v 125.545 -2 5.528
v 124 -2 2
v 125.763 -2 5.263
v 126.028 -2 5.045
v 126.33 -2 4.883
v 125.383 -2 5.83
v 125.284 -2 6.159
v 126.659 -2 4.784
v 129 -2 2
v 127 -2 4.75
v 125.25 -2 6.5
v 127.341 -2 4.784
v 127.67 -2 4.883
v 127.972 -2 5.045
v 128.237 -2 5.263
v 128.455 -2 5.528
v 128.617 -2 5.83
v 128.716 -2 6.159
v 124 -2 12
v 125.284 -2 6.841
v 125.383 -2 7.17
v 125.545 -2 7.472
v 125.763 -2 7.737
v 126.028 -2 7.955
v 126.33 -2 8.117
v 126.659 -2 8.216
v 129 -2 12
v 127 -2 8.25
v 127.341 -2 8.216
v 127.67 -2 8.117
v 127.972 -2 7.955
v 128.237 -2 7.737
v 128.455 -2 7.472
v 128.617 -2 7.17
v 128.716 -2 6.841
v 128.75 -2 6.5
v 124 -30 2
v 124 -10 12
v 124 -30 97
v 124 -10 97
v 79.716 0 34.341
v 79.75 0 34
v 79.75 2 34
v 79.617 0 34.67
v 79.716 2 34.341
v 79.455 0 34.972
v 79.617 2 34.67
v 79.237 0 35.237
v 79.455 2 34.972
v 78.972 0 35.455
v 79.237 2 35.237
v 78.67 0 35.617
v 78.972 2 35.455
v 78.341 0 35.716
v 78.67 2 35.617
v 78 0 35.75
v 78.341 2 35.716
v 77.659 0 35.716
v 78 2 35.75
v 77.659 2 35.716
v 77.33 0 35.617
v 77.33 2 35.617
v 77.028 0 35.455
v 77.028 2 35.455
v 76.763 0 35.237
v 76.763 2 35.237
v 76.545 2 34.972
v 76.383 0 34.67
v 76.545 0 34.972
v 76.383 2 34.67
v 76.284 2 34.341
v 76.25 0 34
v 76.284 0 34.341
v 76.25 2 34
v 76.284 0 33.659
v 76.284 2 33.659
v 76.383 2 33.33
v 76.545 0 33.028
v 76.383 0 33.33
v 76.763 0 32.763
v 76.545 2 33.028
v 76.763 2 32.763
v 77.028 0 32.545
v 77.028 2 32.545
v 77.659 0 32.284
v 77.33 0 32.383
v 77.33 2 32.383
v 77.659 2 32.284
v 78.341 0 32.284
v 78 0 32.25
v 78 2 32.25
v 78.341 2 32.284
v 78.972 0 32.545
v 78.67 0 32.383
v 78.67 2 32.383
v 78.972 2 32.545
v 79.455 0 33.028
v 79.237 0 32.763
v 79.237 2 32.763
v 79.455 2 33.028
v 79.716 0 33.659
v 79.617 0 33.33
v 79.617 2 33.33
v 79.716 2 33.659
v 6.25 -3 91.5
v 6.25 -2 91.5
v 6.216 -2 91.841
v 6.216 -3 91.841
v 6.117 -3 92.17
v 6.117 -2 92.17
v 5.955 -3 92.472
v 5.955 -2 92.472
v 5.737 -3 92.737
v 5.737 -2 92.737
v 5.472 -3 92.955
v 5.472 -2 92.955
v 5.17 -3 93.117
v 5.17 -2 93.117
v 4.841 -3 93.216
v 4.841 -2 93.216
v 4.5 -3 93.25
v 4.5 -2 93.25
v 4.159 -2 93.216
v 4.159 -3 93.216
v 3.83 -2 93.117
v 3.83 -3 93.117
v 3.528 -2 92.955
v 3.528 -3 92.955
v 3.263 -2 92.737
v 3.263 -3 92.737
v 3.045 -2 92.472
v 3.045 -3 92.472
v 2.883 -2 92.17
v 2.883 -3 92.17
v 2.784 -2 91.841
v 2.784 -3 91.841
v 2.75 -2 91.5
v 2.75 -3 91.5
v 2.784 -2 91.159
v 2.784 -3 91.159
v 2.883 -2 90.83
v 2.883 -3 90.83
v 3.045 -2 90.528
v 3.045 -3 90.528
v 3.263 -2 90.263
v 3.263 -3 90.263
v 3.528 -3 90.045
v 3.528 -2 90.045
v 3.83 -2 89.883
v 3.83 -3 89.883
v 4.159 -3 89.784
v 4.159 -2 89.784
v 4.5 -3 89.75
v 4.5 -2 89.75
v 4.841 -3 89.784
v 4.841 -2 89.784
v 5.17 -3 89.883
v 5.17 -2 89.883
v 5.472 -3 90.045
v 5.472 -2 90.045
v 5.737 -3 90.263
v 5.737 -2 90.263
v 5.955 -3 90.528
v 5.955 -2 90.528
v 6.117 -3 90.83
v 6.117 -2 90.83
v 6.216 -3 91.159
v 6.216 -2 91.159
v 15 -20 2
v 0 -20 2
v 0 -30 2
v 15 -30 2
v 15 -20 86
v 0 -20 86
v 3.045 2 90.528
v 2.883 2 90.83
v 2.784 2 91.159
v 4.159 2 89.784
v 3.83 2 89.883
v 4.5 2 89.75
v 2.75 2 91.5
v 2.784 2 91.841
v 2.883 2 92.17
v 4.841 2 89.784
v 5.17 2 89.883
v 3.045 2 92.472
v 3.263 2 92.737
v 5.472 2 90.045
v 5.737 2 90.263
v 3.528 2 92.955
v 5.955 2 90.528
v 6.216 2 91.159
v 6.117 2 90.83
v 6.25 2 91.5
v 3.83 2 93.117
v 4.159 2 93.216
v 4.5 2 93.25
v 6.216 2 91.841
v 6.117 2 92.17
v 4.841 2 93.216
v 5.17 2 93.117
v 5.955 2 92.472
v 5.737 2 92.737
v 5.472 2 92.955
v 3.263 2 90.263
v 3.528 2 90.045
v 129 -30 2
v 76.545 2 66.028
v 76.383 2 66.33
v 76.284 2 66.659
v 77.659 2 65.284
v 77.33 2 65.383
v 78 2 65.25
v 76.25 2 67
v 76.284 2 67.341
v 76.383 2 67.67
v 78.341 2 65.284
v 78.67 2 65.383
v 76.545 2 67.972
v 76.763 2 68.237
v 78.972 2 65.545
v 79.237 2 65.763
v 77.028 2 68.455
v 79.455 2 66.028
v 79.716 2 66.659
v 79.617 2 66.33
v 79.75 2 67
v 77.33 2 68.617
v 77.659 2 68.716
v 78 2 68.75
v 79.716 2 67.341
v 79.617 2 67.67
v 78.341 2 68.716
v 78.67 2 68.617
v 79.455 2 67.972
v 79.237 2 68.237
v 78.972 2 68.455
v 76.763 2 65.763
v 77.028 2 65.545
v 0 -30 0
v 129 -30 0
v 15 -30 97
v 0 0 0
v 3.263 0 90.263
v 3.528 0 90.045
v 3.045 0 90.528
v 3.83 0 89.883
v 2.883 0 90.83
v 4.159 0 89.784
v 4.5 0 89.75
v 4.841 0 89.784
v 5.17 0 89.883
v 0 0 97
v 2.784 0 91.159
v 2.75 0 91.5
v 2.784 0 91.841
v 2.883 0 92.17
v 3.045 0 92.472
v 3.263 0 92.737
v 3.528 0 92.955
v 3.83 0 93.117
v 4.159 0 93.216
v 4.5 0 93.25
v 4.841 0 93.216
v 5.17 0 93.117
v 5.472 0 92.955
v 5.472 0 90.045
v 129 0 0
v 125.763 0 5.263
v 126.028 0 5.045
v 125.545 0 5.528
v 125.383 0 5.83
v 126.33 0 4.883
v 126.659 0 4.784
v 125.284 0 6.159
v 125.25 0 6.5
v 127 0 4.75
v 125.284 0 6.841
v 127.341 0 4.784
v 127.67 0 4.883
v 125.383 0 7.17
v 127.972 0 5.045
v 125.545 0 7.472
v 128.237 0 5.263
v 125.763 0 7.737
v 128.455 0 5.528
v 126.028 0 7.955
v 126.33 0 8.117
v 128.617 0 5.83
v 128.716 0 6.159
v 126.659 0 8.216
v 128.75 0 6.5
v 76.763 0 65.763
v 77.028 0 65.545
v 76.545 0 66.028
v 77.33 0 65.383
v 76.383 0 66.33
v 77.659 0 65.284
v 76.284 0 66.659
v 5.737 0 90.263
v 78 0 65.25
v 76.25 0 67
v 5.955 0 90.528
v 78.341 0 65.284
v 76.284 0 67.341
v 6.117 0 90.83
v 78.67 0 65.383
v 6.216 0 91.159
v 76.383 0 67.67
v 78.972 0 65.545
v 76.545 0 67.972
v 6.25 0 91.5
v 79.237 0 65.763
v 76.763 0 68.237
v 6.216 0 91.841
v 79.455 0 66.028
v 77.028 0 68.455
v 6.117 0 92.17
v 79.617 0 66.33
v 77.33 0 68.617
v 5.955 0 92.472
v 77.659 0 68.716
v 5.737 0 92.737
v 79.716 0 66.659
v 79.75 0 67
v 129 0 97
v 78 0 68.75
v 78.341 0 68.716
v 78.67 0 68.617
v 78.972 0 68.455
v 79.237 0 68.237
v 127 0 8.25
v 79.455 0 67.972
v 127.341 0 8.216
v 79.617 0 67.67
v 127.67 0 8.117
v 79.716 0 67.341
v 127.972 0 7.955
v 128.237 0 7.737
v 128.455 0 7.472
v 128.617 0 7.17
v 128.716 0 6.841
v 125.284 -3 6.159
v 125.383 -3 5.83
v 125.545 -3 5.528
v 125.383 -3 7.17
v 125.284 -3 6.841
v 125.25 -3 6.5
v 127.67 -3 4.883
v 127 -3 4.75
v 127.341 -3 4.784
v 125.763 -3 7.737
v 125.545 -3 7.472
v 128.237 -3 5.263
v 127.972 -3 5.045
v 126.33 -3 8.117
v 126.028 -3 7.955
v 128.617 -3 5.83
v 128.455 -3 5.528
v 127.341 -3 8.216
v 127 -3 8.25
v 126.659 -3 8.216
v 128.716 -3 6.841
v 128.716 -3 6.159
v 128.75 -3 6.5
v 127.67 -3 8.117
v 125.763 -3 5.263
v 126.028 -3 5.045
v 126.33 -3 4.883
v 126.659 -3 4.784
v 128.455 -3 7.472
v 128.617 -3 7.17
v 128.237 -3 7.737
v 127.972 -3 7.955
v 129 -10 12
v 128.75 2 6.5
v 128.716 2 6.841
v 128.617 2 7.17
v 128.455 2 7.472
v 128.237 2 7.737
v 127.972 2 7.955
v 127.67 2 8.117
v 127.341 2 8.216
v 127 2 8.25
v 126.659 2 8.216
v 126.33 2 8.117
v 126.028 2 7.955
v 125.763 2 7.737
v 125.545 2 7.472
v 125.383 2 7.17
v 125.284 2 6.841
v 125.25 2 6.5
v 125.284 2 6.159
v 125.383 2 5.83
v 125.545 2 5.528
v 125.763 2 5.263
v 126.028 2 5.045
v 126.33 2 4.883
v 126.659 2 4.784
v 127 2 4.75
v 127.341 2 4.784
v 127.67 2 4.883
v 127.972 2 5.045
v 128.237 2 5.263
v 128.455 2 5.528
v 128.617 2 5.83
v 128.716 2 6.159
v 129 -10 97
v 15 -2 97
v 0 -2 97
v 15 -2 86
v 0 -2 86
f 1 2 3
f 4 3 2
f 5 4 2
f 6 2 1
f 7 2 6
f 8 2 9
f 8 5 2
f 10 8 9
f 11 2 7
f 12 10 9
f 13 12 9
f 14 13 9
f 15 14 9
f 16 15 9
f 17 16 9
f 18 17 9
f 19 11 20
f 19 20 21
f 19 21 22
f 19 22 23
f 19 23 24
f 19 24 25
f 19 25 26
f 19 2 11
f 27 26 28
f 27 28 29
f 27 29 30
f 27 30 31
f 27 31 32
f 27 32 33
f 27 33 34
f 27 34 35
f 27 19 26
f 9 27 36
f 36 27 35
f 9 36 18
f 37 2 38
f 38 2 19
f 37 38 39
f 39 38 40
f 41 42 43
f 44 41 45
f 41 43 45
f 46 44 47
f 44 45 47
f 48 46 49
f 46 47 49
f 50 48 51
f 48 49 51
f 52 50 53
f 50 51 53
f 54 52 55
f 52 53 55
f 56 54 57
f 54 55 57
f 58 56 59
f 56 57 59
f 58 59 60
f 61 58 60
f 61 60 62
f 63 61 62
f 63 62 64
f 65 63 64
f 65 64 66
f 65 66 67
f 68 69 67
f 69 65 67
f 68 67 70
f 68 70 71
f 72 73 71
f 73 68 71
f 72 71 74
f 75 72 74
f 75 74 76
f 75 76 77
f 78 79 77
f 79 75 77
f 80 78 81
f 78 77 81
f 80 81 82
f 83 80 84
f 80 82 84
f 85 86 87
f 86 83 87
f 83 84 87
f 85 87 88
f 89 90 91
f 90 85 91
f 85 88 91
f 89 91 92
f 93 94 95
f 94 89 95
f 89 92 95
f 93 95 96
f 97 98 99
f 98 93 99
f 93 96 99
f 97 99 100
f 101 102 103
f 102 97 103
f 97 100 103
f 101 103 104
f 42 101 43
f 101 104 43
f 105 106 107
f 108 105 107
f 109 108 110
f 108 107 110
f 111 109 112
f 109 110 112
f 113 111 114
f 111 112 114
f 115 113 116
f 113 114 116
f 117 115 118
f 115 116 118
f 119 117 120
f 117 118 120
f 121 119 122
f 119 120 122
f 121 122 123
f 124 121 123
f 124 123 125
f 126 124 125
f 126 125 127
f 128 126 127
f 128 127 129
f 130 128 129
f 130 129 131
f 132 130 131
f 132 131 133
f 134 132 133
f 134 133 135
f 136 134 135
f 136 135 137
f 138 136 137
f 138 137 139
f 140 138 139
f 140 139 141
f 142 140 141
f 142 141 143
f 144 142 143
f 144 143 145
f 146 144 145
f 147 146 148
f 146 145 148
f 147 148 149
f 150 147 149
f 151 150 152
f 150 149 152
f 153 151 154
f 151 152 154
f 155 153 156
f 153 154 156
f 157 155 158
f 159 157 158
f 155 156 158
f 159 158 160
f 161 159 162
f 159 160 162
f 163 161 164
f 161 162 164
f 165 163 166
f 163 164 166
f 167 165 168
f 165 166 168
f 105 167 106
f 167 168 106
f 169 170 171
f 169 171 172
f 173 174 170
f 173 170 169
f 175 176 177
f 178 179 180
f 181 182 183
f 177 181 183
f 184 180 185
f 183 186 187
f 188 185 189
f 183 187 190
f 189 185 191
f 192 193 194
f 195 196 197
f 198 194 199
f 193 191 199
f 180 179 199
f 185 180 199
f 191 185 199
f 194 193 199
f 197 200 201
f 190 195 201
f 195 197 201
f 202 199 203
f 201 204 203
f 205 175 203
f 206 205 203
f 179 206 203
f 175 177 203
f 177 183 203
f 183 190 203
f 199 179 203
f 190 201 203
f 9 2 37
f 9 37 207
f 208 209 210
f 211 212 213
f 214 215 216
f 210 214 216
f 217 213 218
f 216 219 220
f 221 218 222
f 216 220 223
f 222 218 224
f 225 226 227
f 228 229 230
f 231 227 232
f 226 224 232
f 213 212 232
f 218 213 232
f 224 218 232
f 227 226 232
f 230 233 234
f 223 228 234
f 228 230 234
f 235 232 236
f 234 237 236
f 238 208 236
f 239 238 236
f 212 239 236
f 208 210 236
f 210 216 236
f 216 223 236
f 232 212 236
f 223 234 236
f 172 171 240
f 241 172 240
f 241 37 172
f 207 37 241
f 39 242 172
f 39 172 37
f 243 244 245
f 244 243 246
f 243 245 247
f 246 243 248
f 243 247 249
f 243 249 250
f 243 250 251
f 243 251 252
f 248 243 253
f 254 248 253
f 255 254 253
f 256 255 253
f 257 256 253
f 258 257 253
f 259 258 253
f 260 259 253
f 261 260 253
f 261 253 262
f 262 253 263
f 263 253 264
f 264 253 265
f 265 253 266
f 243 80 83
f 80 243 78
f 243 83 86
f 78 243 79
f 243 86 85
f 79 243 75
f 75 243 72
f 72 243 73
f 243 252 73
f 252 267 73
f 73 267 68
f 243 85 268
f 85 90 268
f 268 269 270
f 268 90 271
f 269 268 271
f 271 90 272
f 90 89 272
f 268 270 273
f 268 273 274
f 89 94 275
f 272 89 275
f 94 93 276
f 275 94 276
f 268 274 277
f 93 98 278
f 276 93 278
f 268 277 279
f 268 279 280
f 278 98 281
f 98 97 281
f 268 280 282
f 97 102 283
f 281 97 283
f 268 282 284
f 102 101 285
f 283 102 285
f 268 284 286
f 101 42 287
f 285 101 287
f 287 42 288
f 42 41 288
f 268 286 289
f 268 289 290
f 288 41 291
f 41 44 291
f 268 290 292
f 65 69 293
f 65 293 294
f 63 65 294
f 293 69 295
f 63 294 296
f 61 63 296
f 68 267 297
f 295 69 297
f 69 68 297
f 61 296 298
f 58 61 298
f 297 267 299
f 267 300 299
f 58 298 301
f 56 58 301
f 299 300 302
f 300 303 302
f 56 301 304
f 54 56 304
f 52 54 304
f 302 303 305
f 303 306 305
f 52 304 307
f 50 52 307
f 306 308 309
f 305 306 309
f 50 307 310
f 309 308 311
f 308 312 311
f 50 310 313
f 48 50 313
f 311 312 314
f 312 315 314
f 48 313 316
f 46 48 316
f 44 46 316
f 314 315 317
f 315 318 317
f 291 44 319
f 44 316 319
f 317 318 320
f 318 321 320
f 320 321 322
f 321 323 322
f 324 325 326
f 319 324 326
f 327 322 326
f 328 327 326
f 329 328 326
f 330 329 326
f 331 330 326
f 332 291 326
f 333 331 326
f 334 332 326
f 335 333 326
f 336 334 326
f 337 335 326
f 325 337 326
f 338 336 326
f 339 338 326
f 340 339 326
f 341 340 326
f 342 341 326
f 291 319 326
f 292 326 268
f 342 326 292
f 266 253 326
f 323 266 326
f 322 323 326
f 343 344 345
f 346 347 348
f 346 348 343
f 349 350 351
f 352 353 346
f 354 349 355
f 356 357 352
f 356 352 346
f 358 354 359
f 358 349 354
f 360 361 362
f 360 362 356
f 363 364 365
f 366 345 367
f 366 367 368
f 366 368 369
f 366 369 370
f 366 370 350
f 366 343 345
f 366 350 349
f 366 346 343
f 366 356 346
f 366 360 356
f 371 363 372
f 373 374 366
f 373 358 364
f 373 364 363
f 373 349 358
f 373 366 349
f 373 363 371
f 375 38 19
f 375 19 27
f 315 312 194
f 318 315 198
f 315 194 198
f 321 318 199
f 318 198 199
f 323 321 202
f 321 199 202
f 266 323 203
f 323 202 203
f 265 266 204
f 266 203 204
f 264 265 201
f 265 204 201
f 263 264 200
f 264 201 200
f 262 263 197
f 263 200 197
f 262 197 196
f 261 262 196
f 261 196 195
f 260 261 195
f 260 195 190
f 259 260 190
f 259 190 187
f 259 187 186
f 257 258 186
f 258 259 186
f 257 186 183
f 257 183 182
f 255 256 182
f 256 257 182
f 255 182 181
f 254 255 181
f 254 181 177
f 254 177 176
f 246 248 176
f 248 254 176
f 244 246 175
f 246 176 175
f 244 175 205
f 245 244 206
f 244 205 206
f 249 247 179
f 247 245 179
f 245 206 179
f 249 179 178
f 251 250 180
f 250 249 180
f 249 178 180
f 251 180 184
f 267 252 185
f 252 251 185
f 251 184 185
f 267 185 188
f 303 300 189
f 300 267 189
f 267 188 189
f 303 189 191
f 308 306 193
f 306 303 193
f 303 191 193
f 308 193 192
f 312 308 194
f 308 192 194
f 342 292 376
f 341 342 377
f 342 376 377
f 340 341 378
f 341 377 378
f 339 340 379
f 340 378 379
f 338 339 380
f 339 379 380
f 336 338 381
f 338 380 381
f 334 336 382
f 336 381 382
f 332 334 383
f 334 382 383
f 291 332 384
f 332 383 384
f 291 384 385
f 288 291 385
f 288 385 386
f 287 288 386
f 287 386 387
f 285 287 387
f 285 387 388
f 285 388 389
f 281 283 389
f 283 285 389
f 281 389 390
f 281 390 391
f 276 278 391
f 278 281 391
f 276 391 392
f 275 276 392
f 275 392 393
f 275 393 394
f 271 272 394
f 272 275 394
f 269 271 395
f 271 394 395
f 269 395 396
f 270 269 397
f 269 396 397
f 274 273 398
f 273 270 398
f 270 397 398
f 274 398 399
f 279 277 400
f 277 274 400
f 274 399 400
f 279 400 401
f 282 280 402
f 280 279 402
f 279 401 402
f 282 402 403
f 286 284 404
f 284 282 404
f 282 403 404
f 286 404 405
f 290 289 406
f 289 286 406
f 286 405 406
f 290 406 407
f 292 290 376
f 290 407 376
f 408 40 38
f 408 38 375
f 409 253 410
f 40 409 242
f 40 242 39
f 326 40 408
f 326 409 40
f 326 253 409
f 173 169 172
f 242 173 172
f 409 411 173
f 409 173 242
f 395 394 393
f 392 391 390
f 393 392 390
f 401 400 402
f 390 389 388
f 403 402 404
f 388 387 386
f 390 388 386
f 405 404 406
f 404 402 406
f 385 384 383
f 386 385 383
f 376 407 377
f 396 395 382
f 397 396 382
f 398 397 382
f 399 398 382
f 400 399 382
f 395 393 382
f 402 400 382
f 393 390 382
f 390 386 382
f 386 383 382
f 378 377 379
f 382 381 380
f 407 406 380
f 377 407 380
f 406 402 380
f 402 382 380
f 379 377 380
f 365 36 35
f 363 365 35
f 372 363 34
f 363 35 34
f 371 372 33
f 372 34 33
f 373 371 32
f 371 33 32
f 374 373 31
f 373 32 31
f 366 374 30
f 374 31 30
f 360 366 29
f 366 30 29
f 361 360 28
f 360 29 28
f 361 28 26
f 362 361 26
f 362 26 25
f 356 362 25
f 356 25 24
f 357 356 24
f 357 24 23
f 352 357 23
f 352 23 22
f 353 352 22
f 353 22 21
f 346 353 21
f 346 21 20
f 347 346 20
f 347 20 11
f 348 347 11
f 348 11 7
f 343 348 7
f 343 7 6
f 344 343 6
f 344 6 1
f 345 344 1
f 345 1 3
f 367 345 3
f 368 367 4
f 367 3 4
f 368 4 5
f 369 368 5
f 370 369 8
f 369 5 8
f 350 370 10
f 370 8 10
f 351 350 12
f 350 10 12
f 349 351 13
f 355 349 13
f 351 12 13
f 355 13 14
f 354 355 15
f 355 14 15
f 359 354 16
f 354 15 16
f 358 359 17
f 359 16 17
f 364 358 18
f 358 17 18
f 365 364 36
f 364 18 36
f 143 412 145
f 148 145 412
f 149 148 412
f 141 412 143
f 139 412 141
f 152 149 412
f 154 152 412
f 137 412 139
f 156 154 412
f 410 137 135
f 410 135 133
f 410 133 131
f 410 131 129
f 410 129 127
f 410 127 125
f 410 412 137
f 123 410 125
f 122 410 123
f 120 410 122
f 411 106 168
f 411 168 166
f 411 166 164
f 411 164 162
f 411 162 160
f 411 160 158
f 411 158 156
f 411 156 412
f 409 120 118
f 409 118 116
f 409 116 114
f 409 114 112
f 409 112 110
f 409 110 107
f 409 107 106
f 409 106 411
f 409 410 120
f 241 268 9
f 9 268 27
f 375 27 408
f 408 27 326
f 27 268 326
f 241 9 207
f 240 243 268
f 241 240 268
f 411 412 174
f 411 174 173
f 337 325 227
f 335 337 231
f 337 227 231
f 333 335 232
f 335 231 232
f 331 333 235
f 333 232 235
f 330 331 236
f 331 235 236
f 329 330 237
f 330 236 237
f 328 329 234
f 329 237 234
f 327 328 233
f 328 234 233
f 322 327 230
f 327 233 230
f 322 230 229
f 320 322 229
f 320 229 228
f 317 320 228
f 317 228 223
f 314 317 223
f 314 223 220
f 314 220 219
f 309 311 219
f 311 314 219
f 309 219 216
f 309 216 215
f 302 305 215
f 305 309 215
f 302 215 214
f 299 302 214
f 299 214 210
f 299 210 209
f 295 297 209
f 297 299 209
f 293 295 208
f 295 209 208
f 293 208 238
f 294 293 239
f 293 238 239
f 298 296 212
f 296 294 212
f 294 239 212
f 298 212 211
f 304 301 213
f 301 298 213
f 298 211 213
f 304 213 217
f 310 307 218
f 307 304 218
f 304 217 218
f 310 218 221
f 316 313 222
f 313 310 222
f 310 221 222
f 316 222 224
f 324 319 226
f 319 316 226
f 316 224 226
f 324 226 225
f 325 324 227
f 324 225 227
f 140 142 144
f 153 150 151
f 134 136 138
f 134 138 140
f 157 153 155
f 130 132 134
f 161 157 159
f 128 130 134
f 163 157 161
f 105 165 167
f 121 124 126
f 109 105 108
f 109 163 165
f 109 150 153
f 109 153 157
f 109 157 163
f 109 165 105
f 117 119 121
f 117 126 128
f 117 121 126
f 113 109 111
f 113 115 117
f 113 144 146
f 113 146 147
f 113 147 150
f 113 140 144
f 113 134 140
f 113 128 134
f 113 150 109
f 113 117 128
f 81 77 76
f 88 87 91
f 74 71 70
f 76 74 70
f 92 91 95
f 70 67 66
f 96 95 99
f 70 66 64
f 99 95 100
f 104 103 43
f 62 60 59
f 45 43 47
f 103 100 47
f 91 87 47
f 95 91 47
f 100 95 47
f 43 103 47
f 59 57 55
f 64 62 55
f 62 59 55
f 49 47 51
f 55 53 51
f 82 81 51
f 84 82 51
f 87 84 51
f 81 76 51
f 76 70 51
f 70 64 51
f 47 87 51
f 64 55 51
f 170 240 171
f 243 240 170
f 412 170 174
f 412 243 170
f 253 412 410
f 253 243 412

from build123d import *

# Parameters (mm, degrees)
SKETCH_W          = 129
SKETCH_H          = 97
PAD_DEPTH         = 30
BOX_W             = 15
BOX_H             = 95
BOX_DEPTH         = 10
BOX001_W          = 15
BOX001_H          = 11
BOX001_DEPTH      = 28
BOX002_W          = 5
BOX002_H          = 10
BOX002_DEPTH      = 28
BOX003_W          = 5
BOX003_H          = 85
BOX003_DEPTH      = 20
CYLINDER_R        = 1.75
CYLINDER_DEPTH    = 5
CYLINDER001_R     = 1.75
CYLINDER001_DEPTH = 5
CYLINDER002_R     = 1.75
CYLINDER002_DEPTH = 5
CYLINDER003_R     = 1.75
CYLINDER003_DEPTH = 5


with BuildPart() as part:
    # Sketch → Pad (new body)
    with BuildSketch(Plane.XZ):
        with Locations((64.5, 48.5)):
            Rectangle(SKETCH_W, SKETCH_H)
    extrude(amount=PAD_DEPTH)

    # Box → Box (cut)
    with BuildSketch(Plane(origin=(0, -20, 2), x_dir=(1, 0, 0), z_dir=(0, -1, 0))):
        with Locations((7.5, 47.5)):
            Rectangle(BOX_W, BOX_H)
    extrude(amount=BOX_DEPTH, mode=Mode.SUBTRACT)

    # Box001 → Box001 (cut)
    with BuildSketch(Plane(origin=(0, -2, 86), x_dir=(1, 0, 0), z_dir=(0, -1, 0))):
        with Locations((7.5, 5.5)):
            Rectangle(BOX001_W, BOX001_H)
    extrude(amount=BOX001_DEPTH, mode=Mode.SUBTRACT)

    # Box002 → Box002 (cut)
    with BuildSketch(Plane(origin=(124, -2, 2), x_dir=(1, 0, 0), z_dir=(0, -1, 0))):
        with Locations((2.5, 5)):
            Rectangle(BOX002_W, BOX002_H)
    extrude(amount=BOX002_DEPTH, mode=Mode.SUBTRACT)

    # Box003 → Box003 (cut)
    with BuildSketch(Plane(origin=(124, -10, 12), x_dir=(1, 0, 0), z_dir=(0, -1, 0))):
        with Locations((2.5, 42.5)):
            Rectangle(BOX003_W, BOX003_H)
    extrude(amount=BOX003_DEPTH, mode=Mode.SUBTRACT)

    # Cylinder → Cylinder (join)
    with BuildSketch(Plane(origin=(127, 2, 6.5), x_dir=(1, 0, 0), z_dir=(0, -1, 0))):
        Circle(CYLINDER_R)
    extrude(amount=CYLINDER_DEPTH)

    # Cylinder001 → Cylinder001 (join)
    with BuildSketch(Plane(origin=(4.5, 2, 91.5), x_dir=(1, 0, 0), z_dir=(0, -1, 0))):
        Circle(CYLINDER001_R)
    extrude(amount=CYLINDER001_DEPTH)

    # Cylinder002 → Cylinder002 (join)
    with BuildSketch(Plane(origin=(78, 2, 34), x_dir=(1, 0, 0), z_dir=(0, -1, 0))):
        Circle(CYLINDER002_R)
    extrude(amount=CYLINDER002_DEPTH)

    # Cylinder003 → Cylinder003 (join)
    with BuildSketch(Plane(origin=(78, 2, 67), x_dir=(1, 0, 0), z_dir=(0, -1, 0))):
        Circle(CYLINDER003_R)
    extrude(amount=CYLINDER003_DEPTH)


solid = part.part
